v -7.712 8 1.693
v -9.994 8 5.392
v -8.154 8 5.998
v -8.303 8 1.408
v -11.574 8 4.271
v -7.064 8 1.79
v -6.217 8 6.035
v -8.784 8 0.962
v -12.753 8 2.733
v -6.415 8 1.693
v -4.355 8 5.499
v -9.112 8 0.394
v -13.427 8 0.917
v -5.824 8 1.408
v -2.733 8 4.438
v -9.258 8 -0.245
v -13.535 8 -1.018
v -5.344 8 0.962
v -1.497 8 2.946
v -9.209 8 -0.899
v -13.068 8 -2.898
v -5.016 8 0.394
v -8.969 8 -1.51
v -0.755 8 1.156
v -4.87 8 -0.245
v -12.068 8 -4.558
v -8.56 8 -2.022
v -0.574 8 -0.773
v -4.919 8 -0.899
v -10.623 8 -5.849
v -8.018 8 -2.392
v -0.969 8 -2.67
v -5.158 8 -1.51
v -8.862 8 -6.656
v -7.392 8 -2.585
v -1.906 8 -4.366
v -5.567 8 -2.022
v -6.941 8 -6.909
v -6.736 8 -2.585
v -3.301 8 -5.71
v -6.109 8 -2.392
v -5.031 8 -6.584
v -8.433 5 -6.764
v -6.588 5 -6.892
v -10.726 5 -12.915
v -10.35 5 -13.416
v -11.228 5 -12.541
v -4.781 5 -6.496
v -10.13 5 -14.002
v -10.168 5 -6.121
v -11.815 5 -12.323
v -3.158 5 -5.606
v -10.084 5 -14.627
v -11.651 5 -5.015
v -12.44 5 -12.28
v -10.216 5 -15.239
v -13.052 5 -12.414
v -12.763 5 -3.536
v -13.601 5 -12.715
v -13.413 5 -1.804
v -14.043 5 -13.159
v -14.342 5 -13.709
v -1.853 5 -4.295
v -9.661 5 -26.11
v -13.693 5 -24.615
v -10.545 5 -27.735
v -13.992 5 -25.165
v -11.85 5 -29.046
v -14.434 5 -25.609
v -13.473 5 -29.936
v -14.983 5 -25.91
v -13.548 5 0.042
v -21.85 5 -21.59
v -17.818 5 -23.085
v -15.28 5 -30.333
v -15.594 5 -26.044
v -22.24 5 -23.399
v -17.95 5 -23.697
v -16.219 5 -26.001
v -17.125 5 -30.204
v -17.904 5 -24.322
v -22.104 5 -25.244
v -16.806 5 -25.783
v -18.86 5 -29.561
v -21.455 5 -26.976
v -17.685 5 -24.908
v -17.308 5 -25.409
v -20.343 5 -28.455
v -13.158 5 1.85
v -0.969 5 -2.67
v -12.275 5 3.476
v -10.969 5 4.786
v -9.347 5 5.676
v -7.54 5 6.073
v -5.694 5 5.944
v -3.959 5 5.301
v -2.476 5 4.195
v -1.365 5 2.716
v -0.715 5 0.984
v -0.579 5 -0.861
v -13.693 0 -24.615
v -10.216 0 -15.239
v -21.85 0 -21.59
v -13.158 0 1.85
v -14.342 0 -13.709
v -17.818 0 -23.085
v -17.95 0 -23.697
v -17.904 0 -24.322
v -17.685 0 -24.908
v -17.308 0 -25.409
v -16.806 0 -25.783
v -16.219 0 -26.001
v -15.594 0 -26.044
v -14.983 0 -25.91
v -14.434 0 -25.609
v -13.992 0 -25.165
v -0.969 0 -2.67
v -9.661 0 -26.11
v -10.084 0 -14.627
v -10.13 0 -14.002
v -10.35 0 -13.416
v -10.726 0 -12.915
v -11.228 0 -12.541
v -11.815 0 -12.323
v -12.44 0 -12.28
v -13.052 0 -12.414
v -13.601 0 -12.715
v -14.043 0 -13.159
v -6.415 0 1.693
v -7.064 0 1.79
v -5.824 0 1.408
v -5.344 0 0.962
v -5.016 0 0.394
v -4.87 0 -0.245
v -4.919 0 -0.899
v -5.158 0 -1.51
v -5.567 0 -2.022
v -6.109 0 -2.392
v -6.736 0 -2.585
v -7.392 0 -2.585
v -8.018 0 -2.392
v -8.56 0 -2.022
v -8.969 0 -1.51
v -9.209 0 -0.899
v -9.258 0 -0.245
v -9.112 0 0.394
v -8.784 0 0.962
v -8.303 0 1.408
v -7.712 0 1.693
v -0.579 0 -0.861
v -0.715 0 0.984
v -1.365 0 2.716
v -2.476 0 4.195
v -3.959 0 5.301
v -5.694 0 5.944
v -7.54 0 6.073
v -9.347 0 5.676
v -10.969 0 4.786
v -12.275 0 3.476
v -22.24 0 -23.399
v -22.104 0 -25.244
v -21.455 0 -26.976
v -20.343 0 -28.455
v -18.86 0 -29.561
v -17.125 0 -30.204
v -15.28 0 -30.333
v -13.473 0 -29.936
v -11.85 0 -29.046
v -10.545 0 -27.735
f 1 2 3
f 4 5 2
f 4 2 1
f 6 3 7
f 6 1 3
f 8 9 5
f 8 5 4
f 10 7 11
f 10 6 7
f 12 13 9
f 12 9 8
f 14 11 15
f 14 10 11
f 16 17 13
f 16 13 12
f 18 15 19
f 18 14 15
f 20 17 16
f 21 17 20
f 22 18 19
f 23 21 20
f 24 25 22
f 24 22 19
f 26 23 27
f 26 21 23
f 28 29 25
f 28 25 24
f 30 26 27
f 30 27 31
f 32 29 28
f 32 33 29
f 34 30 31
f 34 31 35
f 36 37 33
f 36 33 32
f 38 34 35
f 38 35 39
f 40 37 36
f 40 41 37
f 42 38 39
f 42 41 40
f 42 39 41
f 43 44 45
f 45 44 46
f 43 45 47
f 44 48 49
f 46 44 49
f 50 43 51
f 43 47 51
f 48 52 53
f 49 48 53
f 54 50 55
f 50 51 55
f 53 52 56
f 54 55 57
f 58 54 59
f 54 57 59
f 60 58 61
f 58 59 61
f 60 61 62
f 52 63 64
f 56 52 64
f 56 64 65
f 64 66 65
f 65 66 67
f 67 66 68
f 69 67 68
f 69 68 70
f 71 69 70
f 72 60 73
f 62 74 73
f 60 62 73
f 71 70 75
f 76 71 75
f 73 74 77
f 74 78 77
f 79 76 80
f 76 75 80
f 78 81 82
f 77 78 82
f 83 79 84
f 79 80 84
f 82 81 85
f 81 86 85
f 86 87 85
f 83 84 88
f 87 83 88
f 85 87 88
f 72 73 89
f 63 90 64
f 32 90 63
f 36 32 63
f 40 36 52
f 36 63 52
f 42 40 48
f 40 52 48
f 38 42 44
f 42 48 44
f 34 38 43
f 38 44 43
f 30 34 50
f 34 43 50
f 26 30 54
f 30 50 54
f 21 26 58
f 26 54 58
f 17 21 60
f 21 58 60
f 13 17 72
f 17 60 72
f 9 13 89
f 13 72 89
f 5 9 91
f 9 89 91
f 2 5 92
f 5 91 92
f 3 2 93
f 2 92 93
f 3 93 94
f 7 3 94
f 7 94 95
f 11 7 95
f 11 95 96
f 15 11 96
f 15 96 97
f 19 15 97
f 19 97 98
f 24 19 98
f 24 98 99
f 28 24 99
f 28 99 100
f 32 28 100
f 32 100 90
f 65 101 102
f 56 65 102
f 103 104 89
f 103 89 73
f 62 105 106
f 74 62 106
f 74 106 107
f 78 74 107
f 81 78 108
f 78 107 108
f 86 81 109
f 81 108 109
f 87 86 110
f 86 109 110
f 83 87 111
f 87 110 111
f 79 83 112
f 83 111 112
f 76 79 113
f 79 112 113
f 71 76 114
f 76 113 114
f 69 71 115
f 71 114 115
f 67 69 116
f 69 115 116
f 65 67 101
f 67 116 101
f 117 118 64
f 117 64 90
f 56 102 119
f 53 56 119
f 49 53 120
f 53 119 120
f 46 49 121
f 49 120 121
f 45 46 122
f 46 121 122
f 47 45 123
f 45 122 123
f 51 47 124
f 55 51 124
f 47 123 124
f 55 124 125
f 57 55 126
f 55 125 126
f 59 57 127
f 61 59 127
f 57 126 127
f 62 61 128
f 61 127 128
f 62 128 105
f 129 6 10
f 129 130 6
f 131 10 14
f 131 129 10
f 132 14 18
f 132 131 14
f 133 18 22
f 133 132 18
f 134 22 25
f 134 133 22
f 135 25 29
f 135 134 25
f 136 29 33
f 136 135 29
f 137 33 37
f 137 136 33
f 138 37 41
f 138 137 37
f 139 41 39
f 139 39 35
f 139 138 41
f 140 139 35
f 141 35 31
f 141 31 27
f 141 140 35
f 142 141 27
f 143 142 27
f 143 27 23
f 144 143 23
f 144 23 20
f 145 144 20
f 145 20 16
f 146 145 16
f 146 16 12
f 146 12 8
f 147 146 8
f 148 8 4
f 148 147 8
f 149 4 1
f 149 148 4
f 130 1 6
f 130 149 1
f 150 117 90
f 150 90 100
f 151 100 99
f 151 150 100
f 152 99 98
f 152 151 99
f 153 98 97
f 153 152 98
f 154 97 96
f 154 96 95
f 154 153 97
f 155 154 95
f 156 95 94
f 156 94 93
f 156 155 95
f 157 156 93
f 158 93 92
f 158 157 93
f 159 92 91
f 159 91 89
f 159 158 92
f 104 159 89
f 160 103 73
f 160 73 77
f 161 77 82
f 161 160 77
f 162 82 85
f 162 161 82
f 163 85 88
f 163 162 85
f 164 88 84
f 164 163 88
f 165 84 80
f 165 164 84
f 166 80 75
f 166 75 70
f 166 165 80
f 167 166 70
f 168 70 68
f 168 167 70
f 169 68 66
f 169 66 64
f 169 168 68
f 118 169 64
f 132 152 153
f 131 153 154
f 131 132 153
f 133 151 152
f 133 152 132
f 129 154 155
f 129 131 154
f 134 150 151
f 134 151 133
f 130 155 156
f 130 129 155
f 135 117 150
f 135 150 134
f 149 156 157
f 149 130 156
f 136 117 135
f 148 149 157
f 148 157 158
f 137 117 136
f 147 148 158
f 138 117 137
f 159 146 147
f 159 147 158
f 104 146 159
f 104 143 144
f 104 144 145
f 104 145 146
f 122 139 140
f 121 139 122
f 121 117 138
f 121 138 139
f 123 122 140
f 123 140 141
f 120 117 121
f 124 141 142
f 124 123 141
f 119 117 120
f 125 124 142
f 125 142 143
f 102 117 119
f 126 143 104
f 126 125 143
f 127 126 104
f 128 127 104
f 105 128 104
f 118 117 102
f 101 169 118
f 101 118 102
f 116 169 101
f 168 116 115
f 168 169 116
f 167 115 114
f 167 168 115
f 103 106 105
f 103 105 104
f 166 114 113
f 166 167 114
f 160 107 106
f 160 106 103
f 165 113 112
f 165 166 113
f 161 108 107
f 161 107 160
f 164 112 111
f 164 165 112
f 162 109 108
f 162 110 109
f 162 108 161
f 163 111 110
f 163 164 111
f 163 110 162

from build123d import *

# Parameters (mm, degrees)
SKETCH1_R           = 2.2
BOSS_EXTRUDE1_DEPTH = 5
SKETCH2_R           = 6.5
SKETCH2_R_2         = 2.2
BOSS_EXTRUDE2_DEPTH = 3


with BuildPart() as part:
    # Sketch1 → Boss-Extrude1 (new body)
    with BuildSketch(Plane(origin=(0, 0, 0), x_dir=(1, 0, 0), z_dir=(0, 1, 0))):
        with BuildLine():
            Line((-13.158208581, -1.850148868), (-21.850124899, 21.590213559))
            ThreePointArc((-21.850124899, 21.590213559), (-18.015528911, 29.944606033), (-9.661136437, 26.110010045))
            Line((-9.661136437, 26.110010045), (-0.969220119, 2.669647618))
            ThreePointArc((-0.969220119, 2.669647618), (-4.803816107, -5.684744856), (-13.158208581, -1.850148868))
        make_face()
        with Locations(Location((-7.06371435, 0.409749375, 0), (0, 0, 270))):  # turned: the seam where the file's is
            Circle(SKETCH1_R, mode=Mode.SUBTRACT)
        with BuildLine():
            Line((-13.692878775, 24.615000438), (-10.216112247, 15.238855467))
            ThreePointArc((-10.216112247, 15.238855467), (-11.513975505, 12.411214938), (-14.341616034, 13.709078195))
            Line((-14.341616034, 13.709078195), (-17.818382562, 23.085223166))
            ThreePointArc((-17.818382562, 23.085223166), (-16.520519304, 25.912863695), (-13.692878775, 24.615000438))
        make_face(mode=Mode.SUBTRACT)
    extrude(amount=BOSS_EXTRUDE1_DEPTH)

    # Sketch2 → Boss-Extrude2 (add)
    with BuildSketch(Plane(origin=(0, 5, 0), x_dir=(-1, 0, 0), z_dir=(0, 1, 0))):
        with Locations(Location((7.06371435, -0.409749375, 0), (0, 0, 200.345274498))):  # turned: the seam where the file's is
            Circle(SKETCH2_R)
        with Locations(Location((7.06371435, -0.409749375, 0), (0, 0, 90))):  # turned: the seam where the file's is
            Circle(SKETCH2_R_2, mode=Mode.SUBTRACT)
    extrude(amount=BOSS_EXTRUDE2_DEPTH)


solid = part.part
